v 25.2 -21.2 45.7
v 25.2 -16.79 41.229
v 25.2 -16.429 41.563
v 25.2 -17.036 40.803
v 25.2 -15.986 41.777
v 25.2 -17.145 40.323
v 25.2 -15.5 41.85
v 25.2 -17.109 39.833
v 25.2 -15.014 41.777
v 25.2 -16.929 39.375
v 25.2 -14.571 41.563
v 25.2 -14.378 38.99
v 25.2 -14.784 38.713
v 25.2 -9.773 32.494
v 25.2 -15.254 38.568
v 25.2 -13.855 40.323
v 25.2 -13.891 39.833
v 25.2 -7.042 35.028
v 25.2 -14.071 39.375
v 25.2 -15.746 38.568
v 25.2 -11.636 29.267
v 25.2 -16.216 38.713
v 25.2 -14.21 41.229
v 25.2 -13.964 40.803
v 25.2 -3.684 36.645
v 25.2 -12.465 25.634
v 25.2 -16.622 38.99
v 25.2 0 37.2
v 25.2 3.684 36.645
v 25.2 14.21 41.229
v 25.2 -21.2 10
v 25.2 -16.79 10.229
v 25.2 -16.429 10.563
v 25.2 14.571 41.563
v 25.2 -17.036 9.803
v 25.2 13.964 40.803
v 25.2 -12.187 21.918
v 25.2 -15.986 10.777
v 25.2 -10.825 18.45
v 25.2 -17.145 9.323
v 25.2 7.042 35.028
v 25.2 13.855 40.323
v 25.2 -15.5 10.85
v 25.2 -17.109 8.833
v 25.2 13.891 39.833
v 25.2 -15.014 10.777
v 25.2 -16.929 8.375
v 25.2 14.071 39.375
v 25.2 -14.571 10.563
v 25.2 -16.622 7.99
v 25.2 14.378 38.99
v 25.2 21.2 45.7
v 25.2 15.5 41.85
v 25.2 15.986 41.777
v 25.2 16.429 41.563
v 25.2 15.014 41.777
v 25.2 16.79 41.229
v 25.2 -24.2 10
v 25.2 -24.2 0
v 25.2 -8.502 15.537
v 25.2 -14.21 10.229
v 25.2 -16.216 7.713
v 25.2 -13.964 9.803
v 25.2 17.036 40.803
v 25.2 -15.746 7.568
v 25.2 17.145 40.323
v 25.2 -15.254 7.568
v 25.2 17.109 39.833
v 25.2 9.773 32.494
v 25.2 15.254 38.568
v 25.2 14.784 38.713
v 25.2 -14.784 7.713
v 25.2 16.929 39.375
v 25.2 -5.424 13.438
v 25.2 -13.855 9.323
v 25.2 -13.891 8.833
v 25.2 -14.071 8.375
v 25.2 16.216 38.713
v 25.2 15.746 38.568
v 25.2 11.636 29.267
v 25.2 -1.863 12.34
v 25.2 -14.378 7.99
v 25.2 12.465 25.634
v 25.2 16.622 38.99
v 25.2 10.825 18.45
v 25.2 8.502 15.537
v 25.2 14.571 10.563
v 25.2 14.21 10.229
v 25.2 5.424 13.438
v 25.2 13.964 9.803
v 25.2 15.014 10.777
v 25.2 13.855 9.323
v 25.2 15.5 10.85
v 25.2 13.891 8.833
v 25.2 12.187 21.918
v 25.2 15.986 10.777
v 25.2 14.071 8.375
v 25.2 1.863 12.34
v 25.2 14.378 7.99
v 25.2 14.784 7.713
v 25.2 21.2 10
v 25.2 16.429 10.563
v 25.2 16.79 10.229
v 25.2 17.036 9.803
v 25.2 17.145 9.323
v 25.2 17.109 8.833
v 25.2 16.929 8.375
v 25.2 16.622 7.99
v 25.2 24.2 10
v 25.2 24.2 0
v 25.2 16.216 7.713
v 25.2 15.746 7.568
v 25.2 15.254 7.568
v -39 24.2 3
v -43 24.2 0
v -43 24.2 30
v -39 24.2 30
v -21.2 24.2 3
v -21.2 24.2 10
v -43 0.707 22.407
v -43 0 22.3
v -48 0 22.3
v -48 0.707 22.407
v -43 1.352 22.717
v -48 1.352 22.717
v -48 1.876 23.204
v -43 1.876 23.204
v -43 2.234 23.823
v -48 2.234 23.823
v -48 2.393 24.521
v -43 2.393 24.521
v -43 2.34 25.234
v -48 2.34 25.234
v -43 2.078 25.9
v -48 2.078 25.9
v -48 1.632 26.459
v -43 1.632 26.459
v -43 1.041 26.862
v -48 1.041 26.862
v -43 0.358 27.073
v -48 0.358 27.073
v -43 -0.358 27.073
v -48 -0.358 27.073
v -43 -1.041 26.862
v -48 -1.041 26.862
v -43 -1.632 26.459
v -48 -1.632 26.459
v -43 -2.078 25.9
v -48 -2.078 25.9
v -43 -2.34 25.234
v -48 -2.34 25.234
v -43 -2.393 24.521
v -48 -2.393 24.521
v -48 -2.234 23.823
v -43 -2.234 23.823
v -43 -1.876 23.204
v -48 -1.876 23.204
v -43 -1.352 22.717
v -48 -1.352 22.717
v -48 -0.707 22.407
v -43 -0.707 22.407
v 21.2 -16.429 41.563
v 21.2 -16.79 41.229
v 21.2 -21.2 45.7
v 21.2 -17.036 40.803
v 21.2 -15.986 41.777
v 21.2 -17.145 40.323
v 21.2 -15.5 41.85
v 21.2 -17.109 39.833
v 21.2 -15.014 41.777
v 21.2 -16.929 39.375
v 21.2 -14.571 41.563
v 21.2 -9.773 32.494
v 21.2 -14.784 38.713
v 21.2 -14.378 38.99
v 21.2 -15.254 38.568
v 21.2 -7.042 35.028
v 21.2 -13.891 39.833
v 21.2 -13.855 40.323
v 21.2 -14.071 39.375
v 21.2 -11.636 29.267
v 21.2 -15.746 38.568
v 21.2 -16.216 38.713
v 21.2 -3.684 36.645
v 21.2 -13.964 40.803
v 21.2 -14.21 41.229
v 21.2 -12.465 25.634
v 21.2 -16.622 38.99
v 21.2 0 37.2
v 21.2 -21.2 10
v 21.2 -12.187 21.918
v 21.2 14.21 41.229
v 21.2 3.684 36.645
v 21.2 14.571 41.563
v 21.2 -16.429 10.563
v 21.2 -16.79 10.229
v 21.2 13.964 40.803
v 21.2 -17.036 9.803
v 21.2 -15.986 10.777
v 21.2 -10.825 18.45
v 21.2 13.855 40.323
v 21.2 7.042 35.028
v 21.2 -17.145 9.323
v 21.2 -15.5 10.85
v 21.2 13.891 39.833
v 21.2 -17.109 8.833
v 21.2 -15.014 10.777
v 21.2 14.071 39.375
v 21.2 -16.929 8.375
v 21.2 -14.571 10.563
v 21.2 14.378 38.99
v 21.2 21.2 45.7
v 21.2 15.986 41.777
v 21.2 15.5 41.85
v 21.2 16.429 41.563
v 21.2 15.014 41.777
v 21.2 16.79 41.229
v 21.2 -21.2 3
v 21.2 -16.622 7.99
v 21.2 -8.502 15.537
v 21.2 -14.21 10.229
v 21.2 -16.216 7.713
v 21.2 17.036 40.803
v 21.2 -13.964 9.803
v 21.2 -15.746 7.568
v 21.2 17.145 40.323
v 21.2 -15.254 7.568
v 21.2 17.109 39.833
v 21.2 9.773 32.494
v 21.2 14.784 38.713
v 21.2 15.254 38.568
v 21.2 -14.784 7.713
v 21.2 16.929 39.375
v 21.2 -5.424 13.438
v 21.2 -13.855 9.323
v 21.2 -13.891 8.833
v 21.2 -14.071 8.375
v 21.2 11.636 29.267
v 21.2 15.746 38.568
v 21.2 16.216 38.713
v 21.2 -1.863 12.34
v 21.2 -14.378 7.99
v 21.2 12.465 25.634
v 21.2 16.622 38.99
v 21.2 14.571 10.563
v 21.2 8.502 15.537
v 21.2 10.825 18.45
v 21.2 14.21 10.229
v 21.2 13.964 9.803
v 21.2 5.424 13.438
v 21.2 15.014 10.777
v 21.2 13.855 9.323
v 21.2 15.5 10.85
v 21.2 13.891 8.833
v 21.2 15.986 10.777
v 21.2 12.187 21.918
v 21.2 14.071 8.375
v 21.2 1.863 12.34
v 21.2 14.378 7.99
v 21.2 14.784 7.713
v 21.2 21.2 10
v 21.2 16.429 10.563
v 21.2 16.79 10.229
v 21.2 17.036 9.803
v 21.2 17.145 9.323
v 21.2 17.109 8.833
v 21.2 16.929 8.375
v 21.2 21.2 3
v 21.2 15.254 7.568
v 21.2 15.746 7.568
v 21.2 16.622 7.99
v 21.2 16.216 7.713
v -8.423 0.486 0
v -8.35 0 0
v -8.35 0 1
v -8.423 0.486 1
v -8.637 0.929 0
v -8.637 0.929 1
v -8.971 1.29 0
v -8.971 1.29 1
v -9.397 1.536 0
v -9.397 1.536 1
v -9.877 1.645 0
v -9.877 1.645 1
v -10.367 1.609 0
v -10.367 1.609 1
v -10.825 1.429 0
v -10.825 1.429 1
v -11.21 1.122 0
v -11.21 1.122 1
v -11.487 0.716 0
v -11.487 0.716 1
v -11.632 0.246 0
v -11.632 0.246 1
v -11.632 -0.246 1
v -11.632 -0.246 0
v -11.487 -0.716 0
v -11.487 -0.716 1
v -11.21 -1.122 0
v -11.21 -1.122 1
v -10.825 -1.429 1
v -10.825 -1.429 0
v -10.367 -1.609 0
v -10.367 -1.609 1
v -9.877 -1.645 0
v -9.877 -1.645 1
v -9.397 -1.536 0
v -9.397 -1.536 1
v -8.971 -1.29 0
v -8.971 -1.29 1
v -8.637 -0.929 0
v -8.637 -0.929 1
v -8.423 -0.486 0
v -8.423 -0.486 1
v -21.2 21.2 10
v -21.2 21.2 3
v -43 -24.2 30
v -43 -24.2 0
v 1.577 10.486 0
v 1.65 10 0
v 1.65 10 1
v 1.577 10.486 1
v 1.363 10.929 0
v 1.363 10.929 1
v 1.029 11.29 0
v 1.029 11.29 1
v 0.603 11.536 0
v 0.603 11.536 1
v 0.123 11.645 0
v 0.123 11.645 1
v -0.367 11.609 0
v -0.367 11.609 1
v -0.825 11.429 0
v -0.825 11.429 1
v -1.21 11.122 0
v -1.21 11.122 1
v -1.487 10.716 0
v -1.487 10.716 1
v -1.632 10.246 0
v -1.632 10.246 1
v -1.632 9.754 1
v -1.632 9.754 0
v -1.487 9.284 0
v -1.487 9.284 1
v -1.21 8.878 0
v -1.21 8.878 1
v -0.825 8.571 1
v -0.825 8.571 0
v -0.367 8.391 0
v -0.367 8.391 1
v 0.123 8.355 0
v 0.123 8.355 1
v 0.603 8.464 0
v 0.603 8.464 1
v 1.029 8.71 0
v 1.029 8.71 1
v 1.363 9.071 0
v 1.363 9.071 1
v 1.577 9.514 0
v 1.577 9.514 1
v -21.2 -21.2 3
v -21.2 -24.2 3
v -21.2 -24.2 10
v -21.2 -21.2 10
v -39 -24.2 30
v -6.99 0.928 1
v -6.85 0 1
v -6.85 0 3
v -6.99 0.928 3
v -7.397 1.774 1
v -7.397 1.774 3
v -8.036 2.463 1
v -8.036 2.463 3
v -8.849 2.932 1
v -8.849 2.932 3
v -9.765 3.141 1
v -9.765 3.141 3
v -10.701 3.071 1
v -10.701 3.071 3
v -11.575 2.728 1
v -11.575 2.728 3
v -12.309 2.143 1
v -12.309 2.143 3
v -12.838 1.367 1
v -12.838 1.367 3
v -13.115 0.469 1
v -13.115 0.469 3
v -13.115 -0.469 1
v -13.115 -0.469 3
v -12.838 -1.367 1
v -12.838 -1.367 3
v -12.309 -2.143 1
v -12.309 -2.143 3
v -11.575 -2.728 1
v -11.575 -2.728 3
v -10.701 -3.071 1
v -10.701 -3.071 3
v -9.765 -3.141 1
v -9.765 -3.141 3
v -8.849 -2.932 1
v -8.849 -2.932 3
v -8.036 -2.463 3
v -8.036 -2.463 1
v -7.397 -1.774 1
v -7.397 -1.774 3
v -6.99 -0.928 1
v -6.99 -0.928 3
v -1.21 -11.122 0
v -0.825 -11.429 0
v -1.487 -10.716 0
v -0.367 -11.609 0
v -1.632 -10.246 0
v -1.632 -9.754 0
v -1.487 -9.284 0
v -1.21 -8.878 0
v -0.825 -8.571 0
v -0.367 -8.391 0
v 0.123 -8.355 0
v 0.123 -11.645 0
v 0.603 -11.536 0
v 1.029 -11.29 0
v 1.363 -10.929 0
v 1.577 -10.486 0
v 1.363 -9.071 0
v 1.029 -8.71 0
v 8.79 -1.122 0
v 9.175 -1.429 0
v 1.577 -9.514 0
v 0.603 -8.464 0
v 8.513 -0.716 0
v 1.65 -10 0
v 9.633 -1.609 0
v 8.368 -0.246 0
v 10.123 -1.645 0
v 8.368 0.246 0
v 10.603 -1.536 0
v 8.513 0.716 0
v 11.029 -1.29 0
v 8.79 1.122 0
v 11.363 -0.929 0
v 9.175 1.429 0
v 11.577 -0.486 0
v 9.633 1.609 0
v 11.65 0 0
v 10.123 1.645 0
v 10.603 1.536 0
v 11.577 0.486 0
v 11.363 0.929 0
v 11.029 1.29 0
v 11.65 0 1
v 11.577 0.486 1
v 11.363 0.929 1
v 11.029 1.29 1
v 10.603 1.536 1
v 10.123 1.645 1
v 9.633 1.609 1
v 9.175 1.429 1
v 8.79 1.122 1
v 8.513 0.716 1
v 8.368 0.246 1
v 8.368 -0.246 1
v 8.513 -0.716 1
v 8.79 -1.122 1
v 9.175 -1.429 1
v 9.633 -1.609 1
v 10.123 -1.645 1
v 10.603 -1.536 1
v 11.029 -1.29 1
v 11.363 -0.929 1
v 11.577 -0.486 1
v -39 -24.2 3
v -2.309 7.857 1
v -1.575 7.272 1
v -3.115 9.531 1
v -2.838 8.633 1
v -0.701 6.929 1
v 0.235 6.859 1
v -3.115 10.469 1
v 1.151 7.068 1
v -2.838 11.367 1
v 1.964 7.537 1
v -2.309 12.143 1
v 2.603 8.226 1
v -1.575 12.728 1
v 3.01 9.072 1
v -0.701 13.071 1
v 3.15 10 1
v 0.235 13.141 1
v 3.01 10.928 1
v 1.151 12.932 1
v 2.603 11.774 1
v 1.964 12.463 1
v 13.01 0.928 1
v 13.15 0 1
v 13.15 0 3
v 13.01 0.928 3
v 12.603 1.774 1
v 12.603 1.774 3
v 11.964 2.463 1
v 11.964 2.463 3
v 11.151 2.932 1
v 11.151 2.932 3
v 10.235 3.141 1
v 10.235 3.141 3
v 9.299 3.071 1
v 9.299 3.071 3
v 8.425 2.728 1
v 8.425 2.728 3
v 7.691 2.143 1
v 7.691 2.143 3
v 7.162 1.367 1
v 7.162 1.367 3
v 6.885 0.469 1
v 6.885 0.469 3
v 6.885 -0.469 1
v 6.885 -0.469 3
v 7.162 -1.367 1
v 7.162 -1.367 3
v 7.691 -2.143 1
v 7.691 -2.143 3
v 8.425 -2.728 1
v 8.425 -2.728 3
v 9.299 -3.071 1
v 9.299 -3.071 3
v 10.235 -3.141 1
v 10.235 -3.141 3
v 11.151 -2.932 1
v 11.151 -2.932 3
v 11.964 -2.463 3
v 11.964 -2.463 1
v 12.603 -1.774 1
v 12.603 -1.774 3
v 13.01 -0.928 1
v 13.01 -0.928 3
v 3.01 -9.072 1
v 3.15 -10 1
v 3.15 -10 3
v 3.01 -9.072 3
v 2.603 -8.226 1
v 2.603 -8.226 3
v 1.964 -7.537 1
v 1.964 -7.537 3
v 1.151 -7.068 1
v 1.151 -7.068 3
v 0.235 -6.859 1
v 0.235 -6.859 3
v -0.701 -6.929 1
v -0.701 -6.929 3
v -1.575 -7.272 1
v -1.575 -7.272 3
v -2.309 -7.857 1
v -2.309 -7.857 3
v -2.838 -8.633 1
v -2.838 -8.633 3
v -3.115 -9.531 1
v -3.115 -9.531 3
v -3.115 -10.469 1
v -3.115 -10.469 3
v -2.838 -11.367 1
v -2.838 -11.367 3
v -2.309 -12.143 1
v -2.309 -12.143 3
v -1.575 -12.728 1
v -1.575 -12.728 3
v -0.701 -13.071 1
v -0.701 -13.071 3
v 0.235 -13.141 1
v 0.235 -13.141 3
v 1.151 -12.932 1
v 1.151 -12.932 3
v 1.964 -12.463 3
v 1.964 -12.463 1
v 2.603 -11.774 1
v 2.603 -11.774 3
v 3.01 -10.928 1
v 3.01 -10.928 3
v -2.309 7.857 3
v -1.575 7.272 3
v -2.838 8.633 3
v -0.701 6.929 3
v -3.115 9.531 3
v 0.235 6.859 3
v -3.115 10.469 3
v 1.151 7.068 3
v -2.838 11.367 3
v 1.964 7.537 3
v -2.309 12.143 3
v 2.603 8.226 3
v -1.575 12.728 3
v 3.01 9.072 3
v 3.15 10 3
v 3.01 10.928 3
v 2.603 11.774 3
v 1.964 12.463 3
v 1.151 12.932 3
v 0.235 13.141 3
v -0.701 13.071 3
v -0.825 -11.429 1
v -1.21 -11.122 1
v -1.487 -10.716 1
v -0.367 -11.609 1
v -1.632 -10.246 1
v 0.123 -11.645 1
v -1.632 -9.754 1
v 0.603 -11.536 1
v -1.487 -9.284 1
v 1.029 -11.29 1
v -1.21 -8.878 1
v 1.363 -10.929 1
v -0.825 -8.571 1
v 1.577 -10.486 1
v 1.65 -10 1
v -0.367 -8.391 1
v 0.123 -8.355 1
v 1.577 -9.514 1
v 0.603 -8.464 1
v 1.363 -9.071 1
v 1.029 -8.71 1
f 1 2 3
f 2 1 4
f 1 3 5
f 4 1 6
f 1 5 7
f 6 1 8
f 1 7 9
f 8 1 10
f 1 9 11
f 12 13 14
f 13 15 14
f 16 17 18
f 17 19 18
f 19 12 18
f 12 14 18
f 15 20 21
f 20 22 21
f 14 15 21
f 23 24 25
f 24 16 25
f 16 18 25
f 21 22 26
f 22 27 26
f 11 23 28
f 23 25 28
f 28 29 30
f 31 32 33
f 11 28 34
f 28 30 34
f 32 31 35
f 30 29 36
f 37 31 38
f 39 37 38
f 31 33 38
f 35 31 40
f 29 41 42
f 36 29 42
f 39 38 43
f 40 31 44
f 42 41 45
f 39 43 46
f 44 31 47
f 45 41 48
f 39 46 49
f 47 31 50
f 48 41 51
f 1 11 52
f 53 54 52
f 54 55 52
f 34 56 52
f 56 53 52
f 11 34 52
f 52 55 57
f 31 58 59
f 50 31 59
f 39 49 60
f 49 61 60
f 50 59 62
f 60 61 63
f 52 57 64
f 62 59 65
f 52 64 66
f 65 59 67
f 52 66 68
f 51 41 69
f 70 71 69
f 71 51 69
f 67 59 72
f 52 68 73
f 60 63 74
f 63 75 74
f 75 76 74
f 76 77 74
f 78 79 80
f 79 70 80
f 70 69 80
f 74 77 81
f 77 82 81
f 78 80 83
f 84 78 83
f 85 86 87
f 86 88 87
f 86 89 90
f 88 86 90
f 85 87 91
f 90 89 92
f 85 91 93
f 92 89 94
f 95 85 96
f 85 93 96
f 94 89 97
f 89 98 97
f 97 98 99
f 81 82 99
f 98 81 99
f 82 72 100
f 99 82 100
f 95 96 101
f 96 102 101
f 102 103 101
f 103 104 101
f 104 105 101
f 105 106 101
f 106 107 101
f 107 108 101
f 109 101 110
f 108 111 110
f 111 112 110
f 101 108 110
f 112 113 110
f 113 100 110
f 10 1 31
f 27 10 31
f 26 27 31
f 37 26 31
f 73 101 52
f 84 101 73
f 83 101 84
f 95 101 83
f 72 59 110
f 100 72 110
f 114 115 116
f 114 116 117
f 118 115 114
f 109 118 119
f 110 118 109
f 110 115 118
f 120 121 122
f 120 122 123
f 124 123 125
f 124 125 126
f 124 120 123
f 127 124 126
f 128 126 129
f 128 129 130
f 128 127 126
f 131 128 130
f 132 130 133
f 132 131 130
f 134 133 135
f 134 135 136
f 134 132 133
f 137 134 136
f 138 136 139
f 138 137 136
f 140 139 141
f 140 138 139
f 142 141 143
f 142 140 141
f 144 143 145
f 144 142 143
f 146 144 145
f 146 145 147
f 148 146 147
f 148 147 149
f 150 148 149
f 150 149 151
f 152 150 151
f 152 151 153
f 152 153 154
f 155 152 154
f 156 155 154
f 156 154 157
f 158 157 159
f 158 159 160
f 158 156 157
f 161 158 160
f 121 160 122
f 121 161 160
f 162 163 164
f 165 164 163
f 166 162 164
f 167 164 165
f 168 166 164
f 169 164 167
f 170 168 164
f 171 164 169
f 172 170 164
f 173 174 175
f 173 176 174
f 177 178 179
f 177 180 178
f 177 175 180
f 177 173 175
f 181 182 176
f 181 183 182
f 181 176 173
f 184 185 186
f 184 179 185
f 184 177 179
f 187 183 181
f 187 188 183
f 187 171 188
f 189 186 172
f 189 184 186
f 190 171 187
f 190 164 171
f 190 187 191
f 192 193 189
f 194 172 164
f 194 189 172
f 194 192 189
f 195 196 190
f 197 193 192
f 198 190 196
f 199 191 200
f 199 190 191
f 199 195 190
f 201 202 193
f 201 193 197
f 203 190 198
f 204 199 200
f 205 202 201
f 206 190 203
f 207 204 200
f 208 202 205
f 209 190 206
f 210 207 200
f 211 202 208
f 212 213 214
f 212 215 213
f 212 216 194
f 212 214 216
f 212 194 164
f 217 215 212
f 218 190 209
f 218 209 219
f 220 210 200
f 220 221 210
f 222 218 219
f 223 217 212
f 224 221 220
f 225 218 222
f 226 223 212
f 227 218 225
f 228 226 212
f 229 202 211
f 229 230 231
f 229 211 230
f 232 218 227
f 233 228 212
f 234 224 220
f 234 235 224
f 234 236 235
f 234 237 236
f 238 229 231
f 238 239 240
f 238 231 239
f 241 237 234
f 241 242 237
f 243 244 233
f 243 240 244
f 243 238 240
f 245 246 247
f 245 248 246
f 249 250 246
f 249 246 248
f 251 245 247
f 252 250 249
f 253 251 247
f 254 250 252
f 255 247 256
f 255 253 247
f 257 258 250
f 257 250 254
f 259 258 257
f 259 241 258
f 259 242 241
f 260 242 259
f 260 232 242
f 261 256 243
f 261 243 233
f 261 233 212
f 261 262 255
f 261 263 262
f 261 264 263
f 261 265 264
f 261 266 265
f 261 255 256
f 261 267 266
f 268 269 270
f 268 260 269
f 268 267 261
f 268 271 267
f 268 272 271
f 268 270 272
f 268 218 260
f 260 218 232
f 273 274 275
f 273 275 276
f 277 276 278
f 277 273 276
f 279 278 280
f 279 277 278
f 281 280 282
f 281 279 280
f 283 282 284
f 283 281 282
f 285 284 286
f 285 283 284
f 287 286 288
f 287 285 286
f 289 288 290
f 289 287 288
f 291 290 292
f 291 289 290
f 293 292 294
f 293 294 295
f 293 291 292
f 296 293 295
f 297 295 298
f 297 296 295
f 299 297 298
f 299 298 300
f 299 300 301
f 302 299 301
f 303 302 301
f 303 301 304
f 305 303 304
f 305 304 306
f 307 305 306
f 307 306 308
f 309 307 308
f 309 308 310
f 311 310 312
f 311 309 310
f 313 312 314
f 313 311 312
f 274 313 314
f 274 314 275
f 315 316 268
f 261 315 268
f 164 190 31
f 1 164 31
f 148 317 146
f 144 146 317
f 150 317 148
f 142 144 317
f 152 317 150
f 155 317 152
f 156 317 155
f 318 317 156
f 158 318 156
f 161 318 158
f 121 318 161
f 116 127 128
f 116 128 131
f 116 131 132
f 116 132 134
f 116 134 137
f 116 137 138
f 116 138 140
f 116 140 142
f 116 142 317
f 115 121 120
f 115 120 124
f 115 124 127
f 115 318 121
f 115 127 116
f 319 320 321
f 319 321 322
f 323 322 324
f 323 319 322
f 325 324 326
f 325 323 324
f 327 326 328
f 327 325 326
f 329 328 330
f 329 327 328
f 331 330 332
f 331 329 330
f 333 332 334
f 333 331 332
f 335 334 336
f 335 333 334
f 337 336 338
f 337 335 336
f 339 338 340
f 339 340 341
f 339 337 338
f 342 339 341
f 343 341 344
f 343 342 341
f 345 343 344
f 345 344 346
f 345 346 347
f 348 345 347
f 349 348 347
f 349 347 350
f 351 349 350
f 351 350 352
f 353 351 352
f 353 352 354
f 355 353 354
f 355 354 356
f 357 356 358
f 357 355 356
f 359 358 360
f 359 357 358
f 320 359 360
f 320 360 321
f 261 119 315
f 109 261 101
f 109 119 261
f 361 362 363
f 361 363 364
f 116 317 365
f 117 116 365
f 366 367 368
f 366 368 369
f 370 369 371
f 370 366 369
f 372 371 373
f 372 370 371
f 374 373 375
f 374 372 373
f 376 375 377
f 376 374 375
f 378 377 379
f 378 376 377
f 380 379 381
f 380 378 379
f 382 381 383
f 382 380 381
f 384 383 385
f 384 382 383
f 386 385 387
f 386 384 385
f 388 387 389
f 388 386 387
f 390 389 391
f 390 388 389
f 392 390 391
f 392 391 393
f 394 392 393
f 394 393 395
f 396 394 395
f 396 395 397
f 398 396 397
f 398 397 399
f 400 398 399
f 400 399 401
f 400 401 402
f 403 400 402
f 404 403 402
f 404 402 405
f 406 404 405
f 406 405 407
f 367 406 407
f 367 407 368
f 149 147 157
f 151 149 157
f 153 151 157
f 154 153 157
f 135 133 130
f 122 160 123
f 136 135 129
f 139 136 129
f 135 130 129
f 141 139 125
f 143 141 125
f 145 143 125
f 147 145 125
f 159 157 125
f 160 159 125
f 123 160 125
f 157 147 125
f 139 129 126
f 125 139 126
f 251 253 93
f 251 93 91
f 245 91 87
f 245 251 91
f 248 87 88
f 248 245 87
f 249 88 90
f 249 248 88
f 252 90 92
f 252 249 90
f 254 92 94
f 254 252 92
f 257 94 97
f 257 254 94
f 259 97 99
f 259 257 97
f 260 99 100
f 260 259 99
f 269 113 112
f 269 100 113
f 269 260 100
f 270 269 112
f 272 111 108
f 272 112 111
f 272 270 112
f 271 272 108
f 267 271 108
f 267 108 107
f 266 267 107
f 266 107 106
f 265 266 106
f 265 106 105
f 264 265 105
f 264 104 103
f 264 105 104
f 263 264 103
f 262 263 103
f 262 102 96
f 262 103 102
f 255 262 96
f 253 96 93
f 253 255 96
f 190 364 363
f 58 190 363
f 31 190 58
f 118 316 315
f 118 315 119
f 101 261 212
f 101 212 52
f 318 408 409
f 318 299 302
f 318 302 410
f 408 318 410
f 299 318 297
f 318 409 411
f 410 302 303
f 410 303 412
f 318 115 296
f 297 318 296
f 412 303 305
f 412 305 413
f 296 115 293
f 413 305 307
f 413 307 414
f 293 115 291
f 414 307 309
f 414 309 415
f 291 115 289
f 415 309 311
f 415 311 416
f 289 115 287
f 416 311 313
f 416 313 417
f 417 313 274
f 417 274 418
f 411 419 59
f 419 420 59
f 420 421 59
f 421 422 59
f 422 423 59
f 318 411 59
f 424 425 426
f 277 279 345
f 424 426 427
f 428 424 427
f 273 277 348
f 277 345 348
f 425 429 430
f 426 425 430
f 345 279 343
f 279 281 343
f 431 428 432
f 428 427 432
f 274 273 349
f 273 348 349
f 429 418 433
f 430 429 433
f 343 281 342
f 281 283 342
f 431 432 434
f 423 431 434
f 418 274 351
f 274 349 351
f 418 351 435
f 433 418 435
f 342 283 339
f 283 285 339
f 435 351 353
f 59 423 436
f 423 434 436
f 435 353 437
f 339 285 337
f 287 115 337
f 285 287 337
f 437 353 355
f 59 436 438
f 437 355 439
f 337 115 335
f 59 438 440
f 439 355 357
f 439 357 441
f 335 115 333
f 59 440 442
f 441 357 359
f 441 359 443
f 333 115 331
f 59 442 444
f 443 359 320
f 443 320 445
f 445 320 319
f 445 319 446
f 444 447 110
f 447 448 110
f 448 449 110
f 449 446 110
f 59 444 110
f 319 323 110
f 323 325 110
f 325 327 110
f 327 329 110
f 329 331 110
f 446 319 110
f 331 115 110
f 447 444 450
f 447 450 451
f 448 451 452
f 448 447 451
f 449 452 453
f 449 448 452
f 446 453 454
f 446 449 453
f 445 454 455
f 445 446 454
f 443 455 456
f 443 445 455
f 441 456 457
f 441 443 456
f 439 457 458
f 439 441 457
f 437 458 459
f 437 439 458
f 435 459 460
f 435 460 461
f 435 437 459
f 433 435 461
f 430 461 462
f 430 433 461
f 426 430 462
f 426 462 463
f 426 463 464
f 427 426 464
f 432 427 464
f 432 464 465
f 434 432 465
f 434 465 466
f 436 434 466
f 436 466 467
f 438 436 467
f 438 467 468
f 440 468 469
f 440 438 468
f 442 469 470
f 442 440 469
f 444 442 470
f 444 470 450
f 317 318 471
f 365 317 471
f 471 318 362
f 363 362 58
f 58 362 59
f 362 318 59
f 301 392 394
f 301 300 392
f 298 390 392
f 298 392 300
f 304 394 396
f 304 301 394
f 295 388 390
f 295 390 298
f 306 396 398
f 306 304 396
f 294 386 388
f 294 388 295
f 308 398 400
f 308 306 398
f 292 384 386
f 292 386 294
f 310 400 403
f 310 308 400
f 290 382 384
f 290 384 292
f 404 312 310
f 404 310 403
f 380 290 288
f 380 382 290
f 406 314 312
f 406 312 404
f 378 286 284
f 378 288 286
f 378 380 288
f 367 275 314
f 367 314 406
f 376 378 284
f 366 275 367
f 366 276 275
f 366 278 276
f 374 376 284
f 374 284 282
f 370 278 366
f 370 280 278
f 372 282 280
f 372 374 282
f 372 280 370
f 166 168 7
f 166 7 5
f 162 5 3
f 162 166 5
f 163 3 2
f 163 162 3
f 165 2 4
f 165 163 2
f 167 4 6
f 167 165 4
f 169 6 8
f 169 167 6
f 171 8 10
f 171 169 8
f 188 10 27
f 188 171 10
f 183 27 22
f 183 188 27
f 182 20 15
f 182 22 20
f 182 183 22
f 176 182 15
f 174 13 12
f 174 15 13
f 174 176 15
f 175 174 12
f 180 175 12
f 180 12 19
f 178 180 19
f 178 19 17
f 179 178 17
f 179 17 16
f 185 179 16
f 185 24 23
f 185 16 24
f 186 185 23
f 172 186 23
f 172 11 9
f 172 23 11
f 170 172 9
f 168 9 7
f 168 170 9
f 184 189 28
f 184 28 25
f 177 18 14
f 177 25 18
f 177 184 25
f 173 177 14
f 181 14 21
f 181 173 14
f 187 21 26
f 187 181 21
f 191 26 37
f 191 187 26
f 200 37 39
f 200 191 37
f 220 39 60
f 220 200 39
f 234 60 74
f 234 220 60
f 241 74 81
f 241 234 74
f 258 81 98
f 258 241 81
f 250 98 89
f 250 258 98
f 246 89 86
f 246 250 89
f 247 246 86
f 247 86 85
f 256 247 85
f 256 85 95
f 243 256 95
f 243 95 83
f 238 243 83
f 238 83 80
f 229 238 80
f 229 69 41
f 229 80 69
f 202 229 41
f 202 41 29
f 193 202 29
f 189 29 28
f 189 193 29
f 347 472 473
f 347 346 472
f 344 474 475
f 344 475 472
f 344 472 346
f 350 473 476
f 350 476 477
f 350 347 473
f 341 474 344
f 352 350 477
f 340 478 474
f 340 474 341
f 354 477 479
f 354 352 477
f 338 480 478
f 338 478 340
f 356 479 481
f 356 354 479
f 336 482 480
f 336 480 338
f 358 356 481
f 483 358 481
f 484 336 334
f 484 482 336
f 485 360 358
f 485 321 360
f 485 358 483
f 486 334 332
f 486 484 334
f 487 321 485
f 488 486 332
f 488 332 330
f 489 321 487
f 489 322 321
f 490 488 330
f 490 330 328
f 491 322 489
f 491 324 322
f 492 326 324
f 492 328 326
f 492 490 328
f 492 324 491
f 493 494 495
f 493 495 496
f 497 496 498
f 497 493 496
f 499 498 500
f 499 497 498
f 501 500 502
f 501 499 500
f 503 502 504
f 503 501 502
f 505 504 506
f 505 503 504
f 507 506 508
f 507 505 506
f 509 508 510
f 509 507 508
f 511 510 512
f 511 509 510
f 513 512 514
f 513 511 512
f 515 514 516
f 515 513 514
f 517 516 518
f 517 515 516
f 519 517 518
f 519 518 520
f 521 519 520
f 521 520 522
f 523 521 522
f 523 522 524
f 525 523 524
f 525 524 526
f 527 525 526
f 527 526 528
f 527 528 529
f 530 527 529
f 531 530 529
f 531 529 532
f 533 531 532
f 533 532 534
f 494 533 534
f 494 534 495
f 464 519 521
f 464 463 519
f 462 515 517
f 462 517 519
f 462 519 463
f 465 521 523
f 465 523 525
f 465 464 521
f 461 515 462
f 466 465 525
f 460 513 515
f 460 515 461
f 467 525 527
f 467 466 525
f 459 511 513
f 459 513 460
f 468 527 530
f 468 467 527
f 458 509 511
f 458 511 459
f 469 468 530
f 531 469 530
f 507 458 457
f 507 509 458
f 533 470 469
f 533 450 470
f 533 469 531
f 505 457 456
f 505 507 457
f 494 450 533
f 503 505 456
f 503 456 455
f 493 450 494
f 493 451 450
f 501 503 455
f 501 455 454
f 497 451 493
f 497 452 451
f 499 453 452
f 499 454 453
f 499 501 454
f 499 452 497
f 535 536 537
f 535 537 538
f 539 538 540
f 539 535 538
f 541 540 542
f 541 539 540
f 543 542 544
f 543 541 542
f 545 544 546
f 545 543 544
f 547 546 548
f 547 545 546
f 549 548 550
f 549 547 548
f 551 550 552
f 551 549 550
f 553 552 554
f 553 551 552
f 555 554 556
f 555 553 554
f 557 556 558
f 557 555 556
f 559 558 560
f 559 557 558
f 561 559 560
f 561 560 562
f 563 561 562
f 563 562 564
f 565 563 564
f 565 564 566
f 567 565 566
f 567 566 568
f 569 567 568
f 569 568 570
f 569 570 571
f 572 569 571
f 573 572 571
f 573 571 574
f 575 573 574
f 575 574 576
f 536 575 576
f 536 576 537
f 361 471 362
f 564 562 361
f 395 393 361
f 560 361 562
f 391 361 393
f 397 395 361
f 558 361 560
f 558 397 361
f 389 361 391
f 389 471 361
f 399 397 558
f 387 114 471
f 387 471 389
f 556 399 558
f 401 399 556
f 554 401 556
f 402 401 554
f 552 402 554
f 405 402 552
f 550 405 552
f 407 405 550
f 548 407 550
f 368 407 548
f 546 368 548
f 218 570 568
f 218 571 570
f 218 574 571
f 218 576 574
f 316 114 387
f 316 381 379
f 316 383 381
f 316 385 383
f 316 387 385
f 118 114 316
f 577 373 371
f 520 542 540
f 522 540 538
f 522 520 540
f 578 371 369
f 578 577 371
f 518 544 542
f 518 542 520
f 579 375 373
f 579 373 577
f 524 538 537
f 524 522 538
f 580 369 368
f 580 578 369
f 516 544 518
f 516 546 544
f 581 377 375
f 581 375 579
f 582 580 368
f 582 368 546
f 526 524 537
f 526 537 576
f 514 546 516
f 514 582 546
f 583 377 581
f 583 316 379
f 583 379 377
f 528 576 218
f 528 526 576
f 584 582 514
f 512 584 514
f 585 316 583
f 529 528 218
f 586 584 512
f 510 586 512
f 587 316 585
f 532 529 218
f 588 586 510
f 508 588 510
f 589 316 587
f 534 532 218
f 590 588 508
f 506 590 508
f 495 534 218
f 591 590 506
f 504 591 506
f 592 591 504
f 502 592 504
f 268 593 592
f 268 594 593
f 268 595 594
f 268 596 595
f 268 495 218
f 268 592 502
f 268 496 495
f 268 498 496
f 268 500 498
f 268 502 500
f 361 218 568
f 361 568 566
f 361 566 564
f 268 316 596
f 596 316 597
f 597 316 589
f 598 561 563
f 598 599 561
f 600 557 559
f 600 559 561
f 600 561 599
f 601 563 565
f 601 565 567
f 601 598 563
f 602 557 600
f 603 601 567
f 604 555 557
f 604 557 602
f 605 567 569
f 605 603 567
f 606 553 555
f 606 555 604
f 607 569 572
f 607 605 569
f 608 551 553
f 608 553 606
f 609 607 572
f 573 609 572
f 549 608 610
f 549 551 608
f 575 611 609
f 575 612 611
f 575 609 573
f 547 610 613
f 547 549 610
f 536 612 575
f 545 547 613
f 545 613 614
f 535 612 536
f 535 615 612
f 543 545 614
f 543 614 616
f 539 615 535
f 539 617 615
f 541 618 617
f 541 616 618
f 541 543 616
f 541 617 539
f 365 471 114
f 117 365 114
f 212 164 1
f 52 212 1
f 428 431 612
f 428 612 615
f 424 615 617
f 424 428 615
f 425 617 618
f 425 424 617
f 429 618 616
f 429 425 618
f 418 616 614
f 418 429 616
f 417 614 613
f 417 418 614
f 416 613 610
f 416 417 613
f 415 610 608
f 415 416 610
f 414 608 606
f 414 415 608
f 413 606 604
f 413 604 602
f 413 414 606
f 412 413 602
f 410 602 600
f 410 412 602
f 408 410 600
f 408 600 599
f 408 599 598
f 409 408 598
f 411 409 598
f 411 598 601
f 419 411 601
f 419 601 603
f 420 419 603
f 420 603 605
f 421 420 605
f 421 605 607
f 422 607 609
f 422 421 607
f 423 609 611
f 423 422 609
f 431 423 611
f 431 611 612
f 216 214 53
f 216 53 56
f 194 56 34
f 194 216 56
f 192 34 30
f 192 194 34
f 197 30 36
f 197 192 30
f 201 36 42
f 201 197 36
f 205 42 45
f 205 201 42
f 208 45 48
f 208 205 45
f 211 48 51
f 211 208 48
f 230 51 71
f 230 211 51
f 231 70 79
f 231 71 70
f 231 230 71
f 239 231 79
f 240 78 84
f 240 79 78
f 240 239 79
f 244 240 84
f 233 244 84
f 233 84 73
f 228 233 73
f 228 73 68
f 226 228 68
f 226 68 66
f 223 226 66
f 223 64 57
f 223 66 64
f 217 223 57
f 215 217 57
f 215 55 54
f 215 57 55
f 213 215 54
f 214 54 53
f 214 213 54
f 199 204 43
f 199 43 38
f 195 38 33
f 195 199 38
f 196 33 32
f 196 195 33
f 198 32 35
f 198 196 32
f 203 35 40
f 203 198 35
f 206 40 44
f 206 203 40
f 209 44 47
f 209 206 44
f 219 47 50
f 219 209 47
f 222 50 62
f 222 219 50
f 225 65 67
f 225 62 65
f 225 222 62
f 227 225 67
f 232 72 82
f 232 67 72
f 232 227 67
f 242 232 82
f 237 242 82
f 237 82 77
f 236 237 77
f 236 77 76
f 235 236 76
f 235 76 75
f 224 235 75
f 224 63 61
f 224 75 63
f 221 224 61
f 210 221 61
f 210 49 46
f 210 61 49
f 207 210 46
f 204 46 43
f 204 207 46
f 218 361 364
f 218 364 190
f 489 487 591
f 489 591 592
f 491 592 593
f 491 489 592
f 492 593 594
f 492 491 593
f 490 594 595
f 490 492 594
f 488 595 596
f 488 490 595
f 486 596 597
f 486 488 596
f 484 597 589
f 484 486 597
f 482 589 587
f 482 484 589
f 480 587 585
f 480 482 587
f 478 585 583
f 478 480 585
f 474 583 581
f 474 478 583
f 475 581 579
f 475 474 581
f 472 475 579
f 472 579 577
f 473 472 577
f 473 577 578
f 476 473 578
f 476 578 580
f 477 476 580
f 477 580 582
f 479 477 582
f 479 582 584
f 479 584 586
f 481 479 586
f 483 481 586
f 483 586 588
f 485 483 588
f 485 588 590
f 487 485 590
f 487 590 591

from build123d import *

# Parameters (mm, degrees)
SKETCH_1_W          = 42.4
SKETCH_1_H          = 42.4
SKETCH_1_R          = 3.15
EXTRUDE_1_DEPTH     = 3
SKETCH_1_3_R        = 3.15
SKETCH_1_3_R_2      = 1.65
EXTRUDE_2_DEPTH     = 1
SKETCH_2_W          = 4
SKETCH_2_H          = 42.4
EXTRUDE_3_DEPTH     = 45.7
SKETCH_3_R          = 1.65
SKETCH_3_R_2        = 12.5
CUT_EXTRUDE_2_DEPTH = 45.2
SKETCH_4_W          = 46.4
SKETCH_4_H          = 3
EXTRUDE_4_DEPTH     = 10
SKETCH_9_W          = 17.8
SKETCH_9_H          = 48.4
EXTRUDE_8_DEPTH     = 3
SKETCH_10_W         = 4
SKETCH_10_H         = 48.4
EXTRUDE_9_DEPTH     = 30
EXTRUDE_START       = -43
SKETCH_11_R         = 2.4
EXTRUDE_10_DEPTH    = 5


with BuildPart() as part:
    # 草图1 → 凸台-拉伸1 (new body)
    with BuildSketch(Plane.XY):
        Rectangle(SKETCH_1_W, SKETCH_1_H)
        with Locations((-10, 0)):
            Circle(SKETCH_1_R, mode=Mode.SUBTRACT)
        with Locations((0, -10)):
            Circle(SKETCH_1_R, mode=Mode.SUBTRACT)
        with Locations((10, 0)):
            Circle(SKETCH_1_R, mode=Mode.SUBTRACT)
        with Locations((0, 10)):
            Circle(SKETCH_1_R, mode=Mode.SUBTRACT)
    extrude(amount=EXTRUDE_1_DEPTH)

    # 草图1<3> → 凸台-拉伸2 (add)
    # profile 1 of 4: a face of its own
    with BuildSketch(Plane.XY):
        with Locations((-10, 0)):
            Circle(SKETCH_1_3_R)
        with Locations((-10, 0)):
            Circle(SKETCH_1_3_R_2, mode=Mode.SUBTRACT)
    # profile 2 of 4: a face of its own
    with BuildSketch(Plane.XY):
        with Locations((0, 10)):
            Circle(SKETCH_1_3_R)
        with Locations((0, 10)):
            Circle(SKETCH_1_3_R_2, mode=Mode.SUBTRACT)
    # profile 3 of 4: a face of its own
    with BuildSketch(Plane.XY):
        with Locations((10, 0)):
            Circle(SKETCH_1_3_R)
        with Locations((10, 0)):
            Circle(SKETCH_1_3_R_2, mode=Mode.SUBTRACT)
    # profile 4 of 4: a face of its own
    with BuildSketch(Plane.XY):
        with Locations((0, -10)):
            Circle(SKETCH_1_3_R)
        with Locations((0, -10)):
            Circle(SKETCH_1_3_R_2, mode=Mode.SUBTRACT)
    extrude(amount=EXTRUDE_2_DEPTH)

    # 草图2 → 凸台-拉伸3 (add)
    with BuildSketch(Plane.XY):
        with Locations((23.2, 0)):
            Rectangle(SKETCH_2_W, SKETCH_2_H)
    extrude(amount=EXTRUDE_3_DEPTH)

    # 草图3 → 切除-拉伸2 (cut)
    with BuildSketch(Plane(origin=(0, 0, 0), x_dir=(0, 0, -1), z_dir=(1, 0, 0))):
        with Locations(Location((-9.2, -15.5, 0), (0, 0, 180))):
            Circle(SKETCH_3_R)
        with Locations(Location((-40.2, -15.5, 0), (0, 0, 180))):
            Circle(SKETCH_3_R)
        with Locations(Location((-40.2, 15.5, 0), (0, 0, 180))):
            Circle(SKETCH_3_R)
        with Locations(Location((-9.2, 15.5, 0), (0, 0, 180))):
            Circle(SKETCH_3_R)
        with Locations(Location((-24.7, 0, 0), (0, 0, 180))):
            Circle(SKETCH_3_R_2)
    extrude(amount=CUT_EXTRUDE_2_DEPTH, mode=Mode.SUBTRACT)

    # 草图4 → 凸台-拉伸4 (add)
    with BuildSketch(Plane.XY):
        with Locations((2, -22.7)):
            Rectangle(SKETCH_4_W, SKETCH_4_H)
        with Locations((2, 22.7)):
            Rectangle(SKETCH_4_W, SKETCH_4_H)
    extrude(amount=EXTRUDE_4_DEPTH)

    # 草图9 → 凸台-拉伸8 (add)
    with BuildSketch(Plane.XY):
        with Locations((-30.1, 0)):
            Rectangle(SKETCH_9_W, SKETCH_9_H)
    extrude(amount=EXTRUDE_8_DEPTH)

    # 草图10 → 凸台-拉伸9 (add)
    with BuildSketch(Plane.XY):
        with Locations((-41, 0)):
            Rectangle(SKETCH_10_W, SKETCH_10_H)
    extrude(amount=EXTRUDE_9_DEPTH)

    # 草图11 → 凸台-拉伸10 (add)
    with BuildSketch(Plane(origin=(0, 0, 0), x_dir=(0, 0, -1), z_dir=(1, 0, 0)).offset(EXTRUDE_START)):
        with Locations((-24.7, 0)):
            Circle(SKETCH_11_R)
    extrude(amount=-EXTRUDE_10_DEPTH)


solid = part.part
